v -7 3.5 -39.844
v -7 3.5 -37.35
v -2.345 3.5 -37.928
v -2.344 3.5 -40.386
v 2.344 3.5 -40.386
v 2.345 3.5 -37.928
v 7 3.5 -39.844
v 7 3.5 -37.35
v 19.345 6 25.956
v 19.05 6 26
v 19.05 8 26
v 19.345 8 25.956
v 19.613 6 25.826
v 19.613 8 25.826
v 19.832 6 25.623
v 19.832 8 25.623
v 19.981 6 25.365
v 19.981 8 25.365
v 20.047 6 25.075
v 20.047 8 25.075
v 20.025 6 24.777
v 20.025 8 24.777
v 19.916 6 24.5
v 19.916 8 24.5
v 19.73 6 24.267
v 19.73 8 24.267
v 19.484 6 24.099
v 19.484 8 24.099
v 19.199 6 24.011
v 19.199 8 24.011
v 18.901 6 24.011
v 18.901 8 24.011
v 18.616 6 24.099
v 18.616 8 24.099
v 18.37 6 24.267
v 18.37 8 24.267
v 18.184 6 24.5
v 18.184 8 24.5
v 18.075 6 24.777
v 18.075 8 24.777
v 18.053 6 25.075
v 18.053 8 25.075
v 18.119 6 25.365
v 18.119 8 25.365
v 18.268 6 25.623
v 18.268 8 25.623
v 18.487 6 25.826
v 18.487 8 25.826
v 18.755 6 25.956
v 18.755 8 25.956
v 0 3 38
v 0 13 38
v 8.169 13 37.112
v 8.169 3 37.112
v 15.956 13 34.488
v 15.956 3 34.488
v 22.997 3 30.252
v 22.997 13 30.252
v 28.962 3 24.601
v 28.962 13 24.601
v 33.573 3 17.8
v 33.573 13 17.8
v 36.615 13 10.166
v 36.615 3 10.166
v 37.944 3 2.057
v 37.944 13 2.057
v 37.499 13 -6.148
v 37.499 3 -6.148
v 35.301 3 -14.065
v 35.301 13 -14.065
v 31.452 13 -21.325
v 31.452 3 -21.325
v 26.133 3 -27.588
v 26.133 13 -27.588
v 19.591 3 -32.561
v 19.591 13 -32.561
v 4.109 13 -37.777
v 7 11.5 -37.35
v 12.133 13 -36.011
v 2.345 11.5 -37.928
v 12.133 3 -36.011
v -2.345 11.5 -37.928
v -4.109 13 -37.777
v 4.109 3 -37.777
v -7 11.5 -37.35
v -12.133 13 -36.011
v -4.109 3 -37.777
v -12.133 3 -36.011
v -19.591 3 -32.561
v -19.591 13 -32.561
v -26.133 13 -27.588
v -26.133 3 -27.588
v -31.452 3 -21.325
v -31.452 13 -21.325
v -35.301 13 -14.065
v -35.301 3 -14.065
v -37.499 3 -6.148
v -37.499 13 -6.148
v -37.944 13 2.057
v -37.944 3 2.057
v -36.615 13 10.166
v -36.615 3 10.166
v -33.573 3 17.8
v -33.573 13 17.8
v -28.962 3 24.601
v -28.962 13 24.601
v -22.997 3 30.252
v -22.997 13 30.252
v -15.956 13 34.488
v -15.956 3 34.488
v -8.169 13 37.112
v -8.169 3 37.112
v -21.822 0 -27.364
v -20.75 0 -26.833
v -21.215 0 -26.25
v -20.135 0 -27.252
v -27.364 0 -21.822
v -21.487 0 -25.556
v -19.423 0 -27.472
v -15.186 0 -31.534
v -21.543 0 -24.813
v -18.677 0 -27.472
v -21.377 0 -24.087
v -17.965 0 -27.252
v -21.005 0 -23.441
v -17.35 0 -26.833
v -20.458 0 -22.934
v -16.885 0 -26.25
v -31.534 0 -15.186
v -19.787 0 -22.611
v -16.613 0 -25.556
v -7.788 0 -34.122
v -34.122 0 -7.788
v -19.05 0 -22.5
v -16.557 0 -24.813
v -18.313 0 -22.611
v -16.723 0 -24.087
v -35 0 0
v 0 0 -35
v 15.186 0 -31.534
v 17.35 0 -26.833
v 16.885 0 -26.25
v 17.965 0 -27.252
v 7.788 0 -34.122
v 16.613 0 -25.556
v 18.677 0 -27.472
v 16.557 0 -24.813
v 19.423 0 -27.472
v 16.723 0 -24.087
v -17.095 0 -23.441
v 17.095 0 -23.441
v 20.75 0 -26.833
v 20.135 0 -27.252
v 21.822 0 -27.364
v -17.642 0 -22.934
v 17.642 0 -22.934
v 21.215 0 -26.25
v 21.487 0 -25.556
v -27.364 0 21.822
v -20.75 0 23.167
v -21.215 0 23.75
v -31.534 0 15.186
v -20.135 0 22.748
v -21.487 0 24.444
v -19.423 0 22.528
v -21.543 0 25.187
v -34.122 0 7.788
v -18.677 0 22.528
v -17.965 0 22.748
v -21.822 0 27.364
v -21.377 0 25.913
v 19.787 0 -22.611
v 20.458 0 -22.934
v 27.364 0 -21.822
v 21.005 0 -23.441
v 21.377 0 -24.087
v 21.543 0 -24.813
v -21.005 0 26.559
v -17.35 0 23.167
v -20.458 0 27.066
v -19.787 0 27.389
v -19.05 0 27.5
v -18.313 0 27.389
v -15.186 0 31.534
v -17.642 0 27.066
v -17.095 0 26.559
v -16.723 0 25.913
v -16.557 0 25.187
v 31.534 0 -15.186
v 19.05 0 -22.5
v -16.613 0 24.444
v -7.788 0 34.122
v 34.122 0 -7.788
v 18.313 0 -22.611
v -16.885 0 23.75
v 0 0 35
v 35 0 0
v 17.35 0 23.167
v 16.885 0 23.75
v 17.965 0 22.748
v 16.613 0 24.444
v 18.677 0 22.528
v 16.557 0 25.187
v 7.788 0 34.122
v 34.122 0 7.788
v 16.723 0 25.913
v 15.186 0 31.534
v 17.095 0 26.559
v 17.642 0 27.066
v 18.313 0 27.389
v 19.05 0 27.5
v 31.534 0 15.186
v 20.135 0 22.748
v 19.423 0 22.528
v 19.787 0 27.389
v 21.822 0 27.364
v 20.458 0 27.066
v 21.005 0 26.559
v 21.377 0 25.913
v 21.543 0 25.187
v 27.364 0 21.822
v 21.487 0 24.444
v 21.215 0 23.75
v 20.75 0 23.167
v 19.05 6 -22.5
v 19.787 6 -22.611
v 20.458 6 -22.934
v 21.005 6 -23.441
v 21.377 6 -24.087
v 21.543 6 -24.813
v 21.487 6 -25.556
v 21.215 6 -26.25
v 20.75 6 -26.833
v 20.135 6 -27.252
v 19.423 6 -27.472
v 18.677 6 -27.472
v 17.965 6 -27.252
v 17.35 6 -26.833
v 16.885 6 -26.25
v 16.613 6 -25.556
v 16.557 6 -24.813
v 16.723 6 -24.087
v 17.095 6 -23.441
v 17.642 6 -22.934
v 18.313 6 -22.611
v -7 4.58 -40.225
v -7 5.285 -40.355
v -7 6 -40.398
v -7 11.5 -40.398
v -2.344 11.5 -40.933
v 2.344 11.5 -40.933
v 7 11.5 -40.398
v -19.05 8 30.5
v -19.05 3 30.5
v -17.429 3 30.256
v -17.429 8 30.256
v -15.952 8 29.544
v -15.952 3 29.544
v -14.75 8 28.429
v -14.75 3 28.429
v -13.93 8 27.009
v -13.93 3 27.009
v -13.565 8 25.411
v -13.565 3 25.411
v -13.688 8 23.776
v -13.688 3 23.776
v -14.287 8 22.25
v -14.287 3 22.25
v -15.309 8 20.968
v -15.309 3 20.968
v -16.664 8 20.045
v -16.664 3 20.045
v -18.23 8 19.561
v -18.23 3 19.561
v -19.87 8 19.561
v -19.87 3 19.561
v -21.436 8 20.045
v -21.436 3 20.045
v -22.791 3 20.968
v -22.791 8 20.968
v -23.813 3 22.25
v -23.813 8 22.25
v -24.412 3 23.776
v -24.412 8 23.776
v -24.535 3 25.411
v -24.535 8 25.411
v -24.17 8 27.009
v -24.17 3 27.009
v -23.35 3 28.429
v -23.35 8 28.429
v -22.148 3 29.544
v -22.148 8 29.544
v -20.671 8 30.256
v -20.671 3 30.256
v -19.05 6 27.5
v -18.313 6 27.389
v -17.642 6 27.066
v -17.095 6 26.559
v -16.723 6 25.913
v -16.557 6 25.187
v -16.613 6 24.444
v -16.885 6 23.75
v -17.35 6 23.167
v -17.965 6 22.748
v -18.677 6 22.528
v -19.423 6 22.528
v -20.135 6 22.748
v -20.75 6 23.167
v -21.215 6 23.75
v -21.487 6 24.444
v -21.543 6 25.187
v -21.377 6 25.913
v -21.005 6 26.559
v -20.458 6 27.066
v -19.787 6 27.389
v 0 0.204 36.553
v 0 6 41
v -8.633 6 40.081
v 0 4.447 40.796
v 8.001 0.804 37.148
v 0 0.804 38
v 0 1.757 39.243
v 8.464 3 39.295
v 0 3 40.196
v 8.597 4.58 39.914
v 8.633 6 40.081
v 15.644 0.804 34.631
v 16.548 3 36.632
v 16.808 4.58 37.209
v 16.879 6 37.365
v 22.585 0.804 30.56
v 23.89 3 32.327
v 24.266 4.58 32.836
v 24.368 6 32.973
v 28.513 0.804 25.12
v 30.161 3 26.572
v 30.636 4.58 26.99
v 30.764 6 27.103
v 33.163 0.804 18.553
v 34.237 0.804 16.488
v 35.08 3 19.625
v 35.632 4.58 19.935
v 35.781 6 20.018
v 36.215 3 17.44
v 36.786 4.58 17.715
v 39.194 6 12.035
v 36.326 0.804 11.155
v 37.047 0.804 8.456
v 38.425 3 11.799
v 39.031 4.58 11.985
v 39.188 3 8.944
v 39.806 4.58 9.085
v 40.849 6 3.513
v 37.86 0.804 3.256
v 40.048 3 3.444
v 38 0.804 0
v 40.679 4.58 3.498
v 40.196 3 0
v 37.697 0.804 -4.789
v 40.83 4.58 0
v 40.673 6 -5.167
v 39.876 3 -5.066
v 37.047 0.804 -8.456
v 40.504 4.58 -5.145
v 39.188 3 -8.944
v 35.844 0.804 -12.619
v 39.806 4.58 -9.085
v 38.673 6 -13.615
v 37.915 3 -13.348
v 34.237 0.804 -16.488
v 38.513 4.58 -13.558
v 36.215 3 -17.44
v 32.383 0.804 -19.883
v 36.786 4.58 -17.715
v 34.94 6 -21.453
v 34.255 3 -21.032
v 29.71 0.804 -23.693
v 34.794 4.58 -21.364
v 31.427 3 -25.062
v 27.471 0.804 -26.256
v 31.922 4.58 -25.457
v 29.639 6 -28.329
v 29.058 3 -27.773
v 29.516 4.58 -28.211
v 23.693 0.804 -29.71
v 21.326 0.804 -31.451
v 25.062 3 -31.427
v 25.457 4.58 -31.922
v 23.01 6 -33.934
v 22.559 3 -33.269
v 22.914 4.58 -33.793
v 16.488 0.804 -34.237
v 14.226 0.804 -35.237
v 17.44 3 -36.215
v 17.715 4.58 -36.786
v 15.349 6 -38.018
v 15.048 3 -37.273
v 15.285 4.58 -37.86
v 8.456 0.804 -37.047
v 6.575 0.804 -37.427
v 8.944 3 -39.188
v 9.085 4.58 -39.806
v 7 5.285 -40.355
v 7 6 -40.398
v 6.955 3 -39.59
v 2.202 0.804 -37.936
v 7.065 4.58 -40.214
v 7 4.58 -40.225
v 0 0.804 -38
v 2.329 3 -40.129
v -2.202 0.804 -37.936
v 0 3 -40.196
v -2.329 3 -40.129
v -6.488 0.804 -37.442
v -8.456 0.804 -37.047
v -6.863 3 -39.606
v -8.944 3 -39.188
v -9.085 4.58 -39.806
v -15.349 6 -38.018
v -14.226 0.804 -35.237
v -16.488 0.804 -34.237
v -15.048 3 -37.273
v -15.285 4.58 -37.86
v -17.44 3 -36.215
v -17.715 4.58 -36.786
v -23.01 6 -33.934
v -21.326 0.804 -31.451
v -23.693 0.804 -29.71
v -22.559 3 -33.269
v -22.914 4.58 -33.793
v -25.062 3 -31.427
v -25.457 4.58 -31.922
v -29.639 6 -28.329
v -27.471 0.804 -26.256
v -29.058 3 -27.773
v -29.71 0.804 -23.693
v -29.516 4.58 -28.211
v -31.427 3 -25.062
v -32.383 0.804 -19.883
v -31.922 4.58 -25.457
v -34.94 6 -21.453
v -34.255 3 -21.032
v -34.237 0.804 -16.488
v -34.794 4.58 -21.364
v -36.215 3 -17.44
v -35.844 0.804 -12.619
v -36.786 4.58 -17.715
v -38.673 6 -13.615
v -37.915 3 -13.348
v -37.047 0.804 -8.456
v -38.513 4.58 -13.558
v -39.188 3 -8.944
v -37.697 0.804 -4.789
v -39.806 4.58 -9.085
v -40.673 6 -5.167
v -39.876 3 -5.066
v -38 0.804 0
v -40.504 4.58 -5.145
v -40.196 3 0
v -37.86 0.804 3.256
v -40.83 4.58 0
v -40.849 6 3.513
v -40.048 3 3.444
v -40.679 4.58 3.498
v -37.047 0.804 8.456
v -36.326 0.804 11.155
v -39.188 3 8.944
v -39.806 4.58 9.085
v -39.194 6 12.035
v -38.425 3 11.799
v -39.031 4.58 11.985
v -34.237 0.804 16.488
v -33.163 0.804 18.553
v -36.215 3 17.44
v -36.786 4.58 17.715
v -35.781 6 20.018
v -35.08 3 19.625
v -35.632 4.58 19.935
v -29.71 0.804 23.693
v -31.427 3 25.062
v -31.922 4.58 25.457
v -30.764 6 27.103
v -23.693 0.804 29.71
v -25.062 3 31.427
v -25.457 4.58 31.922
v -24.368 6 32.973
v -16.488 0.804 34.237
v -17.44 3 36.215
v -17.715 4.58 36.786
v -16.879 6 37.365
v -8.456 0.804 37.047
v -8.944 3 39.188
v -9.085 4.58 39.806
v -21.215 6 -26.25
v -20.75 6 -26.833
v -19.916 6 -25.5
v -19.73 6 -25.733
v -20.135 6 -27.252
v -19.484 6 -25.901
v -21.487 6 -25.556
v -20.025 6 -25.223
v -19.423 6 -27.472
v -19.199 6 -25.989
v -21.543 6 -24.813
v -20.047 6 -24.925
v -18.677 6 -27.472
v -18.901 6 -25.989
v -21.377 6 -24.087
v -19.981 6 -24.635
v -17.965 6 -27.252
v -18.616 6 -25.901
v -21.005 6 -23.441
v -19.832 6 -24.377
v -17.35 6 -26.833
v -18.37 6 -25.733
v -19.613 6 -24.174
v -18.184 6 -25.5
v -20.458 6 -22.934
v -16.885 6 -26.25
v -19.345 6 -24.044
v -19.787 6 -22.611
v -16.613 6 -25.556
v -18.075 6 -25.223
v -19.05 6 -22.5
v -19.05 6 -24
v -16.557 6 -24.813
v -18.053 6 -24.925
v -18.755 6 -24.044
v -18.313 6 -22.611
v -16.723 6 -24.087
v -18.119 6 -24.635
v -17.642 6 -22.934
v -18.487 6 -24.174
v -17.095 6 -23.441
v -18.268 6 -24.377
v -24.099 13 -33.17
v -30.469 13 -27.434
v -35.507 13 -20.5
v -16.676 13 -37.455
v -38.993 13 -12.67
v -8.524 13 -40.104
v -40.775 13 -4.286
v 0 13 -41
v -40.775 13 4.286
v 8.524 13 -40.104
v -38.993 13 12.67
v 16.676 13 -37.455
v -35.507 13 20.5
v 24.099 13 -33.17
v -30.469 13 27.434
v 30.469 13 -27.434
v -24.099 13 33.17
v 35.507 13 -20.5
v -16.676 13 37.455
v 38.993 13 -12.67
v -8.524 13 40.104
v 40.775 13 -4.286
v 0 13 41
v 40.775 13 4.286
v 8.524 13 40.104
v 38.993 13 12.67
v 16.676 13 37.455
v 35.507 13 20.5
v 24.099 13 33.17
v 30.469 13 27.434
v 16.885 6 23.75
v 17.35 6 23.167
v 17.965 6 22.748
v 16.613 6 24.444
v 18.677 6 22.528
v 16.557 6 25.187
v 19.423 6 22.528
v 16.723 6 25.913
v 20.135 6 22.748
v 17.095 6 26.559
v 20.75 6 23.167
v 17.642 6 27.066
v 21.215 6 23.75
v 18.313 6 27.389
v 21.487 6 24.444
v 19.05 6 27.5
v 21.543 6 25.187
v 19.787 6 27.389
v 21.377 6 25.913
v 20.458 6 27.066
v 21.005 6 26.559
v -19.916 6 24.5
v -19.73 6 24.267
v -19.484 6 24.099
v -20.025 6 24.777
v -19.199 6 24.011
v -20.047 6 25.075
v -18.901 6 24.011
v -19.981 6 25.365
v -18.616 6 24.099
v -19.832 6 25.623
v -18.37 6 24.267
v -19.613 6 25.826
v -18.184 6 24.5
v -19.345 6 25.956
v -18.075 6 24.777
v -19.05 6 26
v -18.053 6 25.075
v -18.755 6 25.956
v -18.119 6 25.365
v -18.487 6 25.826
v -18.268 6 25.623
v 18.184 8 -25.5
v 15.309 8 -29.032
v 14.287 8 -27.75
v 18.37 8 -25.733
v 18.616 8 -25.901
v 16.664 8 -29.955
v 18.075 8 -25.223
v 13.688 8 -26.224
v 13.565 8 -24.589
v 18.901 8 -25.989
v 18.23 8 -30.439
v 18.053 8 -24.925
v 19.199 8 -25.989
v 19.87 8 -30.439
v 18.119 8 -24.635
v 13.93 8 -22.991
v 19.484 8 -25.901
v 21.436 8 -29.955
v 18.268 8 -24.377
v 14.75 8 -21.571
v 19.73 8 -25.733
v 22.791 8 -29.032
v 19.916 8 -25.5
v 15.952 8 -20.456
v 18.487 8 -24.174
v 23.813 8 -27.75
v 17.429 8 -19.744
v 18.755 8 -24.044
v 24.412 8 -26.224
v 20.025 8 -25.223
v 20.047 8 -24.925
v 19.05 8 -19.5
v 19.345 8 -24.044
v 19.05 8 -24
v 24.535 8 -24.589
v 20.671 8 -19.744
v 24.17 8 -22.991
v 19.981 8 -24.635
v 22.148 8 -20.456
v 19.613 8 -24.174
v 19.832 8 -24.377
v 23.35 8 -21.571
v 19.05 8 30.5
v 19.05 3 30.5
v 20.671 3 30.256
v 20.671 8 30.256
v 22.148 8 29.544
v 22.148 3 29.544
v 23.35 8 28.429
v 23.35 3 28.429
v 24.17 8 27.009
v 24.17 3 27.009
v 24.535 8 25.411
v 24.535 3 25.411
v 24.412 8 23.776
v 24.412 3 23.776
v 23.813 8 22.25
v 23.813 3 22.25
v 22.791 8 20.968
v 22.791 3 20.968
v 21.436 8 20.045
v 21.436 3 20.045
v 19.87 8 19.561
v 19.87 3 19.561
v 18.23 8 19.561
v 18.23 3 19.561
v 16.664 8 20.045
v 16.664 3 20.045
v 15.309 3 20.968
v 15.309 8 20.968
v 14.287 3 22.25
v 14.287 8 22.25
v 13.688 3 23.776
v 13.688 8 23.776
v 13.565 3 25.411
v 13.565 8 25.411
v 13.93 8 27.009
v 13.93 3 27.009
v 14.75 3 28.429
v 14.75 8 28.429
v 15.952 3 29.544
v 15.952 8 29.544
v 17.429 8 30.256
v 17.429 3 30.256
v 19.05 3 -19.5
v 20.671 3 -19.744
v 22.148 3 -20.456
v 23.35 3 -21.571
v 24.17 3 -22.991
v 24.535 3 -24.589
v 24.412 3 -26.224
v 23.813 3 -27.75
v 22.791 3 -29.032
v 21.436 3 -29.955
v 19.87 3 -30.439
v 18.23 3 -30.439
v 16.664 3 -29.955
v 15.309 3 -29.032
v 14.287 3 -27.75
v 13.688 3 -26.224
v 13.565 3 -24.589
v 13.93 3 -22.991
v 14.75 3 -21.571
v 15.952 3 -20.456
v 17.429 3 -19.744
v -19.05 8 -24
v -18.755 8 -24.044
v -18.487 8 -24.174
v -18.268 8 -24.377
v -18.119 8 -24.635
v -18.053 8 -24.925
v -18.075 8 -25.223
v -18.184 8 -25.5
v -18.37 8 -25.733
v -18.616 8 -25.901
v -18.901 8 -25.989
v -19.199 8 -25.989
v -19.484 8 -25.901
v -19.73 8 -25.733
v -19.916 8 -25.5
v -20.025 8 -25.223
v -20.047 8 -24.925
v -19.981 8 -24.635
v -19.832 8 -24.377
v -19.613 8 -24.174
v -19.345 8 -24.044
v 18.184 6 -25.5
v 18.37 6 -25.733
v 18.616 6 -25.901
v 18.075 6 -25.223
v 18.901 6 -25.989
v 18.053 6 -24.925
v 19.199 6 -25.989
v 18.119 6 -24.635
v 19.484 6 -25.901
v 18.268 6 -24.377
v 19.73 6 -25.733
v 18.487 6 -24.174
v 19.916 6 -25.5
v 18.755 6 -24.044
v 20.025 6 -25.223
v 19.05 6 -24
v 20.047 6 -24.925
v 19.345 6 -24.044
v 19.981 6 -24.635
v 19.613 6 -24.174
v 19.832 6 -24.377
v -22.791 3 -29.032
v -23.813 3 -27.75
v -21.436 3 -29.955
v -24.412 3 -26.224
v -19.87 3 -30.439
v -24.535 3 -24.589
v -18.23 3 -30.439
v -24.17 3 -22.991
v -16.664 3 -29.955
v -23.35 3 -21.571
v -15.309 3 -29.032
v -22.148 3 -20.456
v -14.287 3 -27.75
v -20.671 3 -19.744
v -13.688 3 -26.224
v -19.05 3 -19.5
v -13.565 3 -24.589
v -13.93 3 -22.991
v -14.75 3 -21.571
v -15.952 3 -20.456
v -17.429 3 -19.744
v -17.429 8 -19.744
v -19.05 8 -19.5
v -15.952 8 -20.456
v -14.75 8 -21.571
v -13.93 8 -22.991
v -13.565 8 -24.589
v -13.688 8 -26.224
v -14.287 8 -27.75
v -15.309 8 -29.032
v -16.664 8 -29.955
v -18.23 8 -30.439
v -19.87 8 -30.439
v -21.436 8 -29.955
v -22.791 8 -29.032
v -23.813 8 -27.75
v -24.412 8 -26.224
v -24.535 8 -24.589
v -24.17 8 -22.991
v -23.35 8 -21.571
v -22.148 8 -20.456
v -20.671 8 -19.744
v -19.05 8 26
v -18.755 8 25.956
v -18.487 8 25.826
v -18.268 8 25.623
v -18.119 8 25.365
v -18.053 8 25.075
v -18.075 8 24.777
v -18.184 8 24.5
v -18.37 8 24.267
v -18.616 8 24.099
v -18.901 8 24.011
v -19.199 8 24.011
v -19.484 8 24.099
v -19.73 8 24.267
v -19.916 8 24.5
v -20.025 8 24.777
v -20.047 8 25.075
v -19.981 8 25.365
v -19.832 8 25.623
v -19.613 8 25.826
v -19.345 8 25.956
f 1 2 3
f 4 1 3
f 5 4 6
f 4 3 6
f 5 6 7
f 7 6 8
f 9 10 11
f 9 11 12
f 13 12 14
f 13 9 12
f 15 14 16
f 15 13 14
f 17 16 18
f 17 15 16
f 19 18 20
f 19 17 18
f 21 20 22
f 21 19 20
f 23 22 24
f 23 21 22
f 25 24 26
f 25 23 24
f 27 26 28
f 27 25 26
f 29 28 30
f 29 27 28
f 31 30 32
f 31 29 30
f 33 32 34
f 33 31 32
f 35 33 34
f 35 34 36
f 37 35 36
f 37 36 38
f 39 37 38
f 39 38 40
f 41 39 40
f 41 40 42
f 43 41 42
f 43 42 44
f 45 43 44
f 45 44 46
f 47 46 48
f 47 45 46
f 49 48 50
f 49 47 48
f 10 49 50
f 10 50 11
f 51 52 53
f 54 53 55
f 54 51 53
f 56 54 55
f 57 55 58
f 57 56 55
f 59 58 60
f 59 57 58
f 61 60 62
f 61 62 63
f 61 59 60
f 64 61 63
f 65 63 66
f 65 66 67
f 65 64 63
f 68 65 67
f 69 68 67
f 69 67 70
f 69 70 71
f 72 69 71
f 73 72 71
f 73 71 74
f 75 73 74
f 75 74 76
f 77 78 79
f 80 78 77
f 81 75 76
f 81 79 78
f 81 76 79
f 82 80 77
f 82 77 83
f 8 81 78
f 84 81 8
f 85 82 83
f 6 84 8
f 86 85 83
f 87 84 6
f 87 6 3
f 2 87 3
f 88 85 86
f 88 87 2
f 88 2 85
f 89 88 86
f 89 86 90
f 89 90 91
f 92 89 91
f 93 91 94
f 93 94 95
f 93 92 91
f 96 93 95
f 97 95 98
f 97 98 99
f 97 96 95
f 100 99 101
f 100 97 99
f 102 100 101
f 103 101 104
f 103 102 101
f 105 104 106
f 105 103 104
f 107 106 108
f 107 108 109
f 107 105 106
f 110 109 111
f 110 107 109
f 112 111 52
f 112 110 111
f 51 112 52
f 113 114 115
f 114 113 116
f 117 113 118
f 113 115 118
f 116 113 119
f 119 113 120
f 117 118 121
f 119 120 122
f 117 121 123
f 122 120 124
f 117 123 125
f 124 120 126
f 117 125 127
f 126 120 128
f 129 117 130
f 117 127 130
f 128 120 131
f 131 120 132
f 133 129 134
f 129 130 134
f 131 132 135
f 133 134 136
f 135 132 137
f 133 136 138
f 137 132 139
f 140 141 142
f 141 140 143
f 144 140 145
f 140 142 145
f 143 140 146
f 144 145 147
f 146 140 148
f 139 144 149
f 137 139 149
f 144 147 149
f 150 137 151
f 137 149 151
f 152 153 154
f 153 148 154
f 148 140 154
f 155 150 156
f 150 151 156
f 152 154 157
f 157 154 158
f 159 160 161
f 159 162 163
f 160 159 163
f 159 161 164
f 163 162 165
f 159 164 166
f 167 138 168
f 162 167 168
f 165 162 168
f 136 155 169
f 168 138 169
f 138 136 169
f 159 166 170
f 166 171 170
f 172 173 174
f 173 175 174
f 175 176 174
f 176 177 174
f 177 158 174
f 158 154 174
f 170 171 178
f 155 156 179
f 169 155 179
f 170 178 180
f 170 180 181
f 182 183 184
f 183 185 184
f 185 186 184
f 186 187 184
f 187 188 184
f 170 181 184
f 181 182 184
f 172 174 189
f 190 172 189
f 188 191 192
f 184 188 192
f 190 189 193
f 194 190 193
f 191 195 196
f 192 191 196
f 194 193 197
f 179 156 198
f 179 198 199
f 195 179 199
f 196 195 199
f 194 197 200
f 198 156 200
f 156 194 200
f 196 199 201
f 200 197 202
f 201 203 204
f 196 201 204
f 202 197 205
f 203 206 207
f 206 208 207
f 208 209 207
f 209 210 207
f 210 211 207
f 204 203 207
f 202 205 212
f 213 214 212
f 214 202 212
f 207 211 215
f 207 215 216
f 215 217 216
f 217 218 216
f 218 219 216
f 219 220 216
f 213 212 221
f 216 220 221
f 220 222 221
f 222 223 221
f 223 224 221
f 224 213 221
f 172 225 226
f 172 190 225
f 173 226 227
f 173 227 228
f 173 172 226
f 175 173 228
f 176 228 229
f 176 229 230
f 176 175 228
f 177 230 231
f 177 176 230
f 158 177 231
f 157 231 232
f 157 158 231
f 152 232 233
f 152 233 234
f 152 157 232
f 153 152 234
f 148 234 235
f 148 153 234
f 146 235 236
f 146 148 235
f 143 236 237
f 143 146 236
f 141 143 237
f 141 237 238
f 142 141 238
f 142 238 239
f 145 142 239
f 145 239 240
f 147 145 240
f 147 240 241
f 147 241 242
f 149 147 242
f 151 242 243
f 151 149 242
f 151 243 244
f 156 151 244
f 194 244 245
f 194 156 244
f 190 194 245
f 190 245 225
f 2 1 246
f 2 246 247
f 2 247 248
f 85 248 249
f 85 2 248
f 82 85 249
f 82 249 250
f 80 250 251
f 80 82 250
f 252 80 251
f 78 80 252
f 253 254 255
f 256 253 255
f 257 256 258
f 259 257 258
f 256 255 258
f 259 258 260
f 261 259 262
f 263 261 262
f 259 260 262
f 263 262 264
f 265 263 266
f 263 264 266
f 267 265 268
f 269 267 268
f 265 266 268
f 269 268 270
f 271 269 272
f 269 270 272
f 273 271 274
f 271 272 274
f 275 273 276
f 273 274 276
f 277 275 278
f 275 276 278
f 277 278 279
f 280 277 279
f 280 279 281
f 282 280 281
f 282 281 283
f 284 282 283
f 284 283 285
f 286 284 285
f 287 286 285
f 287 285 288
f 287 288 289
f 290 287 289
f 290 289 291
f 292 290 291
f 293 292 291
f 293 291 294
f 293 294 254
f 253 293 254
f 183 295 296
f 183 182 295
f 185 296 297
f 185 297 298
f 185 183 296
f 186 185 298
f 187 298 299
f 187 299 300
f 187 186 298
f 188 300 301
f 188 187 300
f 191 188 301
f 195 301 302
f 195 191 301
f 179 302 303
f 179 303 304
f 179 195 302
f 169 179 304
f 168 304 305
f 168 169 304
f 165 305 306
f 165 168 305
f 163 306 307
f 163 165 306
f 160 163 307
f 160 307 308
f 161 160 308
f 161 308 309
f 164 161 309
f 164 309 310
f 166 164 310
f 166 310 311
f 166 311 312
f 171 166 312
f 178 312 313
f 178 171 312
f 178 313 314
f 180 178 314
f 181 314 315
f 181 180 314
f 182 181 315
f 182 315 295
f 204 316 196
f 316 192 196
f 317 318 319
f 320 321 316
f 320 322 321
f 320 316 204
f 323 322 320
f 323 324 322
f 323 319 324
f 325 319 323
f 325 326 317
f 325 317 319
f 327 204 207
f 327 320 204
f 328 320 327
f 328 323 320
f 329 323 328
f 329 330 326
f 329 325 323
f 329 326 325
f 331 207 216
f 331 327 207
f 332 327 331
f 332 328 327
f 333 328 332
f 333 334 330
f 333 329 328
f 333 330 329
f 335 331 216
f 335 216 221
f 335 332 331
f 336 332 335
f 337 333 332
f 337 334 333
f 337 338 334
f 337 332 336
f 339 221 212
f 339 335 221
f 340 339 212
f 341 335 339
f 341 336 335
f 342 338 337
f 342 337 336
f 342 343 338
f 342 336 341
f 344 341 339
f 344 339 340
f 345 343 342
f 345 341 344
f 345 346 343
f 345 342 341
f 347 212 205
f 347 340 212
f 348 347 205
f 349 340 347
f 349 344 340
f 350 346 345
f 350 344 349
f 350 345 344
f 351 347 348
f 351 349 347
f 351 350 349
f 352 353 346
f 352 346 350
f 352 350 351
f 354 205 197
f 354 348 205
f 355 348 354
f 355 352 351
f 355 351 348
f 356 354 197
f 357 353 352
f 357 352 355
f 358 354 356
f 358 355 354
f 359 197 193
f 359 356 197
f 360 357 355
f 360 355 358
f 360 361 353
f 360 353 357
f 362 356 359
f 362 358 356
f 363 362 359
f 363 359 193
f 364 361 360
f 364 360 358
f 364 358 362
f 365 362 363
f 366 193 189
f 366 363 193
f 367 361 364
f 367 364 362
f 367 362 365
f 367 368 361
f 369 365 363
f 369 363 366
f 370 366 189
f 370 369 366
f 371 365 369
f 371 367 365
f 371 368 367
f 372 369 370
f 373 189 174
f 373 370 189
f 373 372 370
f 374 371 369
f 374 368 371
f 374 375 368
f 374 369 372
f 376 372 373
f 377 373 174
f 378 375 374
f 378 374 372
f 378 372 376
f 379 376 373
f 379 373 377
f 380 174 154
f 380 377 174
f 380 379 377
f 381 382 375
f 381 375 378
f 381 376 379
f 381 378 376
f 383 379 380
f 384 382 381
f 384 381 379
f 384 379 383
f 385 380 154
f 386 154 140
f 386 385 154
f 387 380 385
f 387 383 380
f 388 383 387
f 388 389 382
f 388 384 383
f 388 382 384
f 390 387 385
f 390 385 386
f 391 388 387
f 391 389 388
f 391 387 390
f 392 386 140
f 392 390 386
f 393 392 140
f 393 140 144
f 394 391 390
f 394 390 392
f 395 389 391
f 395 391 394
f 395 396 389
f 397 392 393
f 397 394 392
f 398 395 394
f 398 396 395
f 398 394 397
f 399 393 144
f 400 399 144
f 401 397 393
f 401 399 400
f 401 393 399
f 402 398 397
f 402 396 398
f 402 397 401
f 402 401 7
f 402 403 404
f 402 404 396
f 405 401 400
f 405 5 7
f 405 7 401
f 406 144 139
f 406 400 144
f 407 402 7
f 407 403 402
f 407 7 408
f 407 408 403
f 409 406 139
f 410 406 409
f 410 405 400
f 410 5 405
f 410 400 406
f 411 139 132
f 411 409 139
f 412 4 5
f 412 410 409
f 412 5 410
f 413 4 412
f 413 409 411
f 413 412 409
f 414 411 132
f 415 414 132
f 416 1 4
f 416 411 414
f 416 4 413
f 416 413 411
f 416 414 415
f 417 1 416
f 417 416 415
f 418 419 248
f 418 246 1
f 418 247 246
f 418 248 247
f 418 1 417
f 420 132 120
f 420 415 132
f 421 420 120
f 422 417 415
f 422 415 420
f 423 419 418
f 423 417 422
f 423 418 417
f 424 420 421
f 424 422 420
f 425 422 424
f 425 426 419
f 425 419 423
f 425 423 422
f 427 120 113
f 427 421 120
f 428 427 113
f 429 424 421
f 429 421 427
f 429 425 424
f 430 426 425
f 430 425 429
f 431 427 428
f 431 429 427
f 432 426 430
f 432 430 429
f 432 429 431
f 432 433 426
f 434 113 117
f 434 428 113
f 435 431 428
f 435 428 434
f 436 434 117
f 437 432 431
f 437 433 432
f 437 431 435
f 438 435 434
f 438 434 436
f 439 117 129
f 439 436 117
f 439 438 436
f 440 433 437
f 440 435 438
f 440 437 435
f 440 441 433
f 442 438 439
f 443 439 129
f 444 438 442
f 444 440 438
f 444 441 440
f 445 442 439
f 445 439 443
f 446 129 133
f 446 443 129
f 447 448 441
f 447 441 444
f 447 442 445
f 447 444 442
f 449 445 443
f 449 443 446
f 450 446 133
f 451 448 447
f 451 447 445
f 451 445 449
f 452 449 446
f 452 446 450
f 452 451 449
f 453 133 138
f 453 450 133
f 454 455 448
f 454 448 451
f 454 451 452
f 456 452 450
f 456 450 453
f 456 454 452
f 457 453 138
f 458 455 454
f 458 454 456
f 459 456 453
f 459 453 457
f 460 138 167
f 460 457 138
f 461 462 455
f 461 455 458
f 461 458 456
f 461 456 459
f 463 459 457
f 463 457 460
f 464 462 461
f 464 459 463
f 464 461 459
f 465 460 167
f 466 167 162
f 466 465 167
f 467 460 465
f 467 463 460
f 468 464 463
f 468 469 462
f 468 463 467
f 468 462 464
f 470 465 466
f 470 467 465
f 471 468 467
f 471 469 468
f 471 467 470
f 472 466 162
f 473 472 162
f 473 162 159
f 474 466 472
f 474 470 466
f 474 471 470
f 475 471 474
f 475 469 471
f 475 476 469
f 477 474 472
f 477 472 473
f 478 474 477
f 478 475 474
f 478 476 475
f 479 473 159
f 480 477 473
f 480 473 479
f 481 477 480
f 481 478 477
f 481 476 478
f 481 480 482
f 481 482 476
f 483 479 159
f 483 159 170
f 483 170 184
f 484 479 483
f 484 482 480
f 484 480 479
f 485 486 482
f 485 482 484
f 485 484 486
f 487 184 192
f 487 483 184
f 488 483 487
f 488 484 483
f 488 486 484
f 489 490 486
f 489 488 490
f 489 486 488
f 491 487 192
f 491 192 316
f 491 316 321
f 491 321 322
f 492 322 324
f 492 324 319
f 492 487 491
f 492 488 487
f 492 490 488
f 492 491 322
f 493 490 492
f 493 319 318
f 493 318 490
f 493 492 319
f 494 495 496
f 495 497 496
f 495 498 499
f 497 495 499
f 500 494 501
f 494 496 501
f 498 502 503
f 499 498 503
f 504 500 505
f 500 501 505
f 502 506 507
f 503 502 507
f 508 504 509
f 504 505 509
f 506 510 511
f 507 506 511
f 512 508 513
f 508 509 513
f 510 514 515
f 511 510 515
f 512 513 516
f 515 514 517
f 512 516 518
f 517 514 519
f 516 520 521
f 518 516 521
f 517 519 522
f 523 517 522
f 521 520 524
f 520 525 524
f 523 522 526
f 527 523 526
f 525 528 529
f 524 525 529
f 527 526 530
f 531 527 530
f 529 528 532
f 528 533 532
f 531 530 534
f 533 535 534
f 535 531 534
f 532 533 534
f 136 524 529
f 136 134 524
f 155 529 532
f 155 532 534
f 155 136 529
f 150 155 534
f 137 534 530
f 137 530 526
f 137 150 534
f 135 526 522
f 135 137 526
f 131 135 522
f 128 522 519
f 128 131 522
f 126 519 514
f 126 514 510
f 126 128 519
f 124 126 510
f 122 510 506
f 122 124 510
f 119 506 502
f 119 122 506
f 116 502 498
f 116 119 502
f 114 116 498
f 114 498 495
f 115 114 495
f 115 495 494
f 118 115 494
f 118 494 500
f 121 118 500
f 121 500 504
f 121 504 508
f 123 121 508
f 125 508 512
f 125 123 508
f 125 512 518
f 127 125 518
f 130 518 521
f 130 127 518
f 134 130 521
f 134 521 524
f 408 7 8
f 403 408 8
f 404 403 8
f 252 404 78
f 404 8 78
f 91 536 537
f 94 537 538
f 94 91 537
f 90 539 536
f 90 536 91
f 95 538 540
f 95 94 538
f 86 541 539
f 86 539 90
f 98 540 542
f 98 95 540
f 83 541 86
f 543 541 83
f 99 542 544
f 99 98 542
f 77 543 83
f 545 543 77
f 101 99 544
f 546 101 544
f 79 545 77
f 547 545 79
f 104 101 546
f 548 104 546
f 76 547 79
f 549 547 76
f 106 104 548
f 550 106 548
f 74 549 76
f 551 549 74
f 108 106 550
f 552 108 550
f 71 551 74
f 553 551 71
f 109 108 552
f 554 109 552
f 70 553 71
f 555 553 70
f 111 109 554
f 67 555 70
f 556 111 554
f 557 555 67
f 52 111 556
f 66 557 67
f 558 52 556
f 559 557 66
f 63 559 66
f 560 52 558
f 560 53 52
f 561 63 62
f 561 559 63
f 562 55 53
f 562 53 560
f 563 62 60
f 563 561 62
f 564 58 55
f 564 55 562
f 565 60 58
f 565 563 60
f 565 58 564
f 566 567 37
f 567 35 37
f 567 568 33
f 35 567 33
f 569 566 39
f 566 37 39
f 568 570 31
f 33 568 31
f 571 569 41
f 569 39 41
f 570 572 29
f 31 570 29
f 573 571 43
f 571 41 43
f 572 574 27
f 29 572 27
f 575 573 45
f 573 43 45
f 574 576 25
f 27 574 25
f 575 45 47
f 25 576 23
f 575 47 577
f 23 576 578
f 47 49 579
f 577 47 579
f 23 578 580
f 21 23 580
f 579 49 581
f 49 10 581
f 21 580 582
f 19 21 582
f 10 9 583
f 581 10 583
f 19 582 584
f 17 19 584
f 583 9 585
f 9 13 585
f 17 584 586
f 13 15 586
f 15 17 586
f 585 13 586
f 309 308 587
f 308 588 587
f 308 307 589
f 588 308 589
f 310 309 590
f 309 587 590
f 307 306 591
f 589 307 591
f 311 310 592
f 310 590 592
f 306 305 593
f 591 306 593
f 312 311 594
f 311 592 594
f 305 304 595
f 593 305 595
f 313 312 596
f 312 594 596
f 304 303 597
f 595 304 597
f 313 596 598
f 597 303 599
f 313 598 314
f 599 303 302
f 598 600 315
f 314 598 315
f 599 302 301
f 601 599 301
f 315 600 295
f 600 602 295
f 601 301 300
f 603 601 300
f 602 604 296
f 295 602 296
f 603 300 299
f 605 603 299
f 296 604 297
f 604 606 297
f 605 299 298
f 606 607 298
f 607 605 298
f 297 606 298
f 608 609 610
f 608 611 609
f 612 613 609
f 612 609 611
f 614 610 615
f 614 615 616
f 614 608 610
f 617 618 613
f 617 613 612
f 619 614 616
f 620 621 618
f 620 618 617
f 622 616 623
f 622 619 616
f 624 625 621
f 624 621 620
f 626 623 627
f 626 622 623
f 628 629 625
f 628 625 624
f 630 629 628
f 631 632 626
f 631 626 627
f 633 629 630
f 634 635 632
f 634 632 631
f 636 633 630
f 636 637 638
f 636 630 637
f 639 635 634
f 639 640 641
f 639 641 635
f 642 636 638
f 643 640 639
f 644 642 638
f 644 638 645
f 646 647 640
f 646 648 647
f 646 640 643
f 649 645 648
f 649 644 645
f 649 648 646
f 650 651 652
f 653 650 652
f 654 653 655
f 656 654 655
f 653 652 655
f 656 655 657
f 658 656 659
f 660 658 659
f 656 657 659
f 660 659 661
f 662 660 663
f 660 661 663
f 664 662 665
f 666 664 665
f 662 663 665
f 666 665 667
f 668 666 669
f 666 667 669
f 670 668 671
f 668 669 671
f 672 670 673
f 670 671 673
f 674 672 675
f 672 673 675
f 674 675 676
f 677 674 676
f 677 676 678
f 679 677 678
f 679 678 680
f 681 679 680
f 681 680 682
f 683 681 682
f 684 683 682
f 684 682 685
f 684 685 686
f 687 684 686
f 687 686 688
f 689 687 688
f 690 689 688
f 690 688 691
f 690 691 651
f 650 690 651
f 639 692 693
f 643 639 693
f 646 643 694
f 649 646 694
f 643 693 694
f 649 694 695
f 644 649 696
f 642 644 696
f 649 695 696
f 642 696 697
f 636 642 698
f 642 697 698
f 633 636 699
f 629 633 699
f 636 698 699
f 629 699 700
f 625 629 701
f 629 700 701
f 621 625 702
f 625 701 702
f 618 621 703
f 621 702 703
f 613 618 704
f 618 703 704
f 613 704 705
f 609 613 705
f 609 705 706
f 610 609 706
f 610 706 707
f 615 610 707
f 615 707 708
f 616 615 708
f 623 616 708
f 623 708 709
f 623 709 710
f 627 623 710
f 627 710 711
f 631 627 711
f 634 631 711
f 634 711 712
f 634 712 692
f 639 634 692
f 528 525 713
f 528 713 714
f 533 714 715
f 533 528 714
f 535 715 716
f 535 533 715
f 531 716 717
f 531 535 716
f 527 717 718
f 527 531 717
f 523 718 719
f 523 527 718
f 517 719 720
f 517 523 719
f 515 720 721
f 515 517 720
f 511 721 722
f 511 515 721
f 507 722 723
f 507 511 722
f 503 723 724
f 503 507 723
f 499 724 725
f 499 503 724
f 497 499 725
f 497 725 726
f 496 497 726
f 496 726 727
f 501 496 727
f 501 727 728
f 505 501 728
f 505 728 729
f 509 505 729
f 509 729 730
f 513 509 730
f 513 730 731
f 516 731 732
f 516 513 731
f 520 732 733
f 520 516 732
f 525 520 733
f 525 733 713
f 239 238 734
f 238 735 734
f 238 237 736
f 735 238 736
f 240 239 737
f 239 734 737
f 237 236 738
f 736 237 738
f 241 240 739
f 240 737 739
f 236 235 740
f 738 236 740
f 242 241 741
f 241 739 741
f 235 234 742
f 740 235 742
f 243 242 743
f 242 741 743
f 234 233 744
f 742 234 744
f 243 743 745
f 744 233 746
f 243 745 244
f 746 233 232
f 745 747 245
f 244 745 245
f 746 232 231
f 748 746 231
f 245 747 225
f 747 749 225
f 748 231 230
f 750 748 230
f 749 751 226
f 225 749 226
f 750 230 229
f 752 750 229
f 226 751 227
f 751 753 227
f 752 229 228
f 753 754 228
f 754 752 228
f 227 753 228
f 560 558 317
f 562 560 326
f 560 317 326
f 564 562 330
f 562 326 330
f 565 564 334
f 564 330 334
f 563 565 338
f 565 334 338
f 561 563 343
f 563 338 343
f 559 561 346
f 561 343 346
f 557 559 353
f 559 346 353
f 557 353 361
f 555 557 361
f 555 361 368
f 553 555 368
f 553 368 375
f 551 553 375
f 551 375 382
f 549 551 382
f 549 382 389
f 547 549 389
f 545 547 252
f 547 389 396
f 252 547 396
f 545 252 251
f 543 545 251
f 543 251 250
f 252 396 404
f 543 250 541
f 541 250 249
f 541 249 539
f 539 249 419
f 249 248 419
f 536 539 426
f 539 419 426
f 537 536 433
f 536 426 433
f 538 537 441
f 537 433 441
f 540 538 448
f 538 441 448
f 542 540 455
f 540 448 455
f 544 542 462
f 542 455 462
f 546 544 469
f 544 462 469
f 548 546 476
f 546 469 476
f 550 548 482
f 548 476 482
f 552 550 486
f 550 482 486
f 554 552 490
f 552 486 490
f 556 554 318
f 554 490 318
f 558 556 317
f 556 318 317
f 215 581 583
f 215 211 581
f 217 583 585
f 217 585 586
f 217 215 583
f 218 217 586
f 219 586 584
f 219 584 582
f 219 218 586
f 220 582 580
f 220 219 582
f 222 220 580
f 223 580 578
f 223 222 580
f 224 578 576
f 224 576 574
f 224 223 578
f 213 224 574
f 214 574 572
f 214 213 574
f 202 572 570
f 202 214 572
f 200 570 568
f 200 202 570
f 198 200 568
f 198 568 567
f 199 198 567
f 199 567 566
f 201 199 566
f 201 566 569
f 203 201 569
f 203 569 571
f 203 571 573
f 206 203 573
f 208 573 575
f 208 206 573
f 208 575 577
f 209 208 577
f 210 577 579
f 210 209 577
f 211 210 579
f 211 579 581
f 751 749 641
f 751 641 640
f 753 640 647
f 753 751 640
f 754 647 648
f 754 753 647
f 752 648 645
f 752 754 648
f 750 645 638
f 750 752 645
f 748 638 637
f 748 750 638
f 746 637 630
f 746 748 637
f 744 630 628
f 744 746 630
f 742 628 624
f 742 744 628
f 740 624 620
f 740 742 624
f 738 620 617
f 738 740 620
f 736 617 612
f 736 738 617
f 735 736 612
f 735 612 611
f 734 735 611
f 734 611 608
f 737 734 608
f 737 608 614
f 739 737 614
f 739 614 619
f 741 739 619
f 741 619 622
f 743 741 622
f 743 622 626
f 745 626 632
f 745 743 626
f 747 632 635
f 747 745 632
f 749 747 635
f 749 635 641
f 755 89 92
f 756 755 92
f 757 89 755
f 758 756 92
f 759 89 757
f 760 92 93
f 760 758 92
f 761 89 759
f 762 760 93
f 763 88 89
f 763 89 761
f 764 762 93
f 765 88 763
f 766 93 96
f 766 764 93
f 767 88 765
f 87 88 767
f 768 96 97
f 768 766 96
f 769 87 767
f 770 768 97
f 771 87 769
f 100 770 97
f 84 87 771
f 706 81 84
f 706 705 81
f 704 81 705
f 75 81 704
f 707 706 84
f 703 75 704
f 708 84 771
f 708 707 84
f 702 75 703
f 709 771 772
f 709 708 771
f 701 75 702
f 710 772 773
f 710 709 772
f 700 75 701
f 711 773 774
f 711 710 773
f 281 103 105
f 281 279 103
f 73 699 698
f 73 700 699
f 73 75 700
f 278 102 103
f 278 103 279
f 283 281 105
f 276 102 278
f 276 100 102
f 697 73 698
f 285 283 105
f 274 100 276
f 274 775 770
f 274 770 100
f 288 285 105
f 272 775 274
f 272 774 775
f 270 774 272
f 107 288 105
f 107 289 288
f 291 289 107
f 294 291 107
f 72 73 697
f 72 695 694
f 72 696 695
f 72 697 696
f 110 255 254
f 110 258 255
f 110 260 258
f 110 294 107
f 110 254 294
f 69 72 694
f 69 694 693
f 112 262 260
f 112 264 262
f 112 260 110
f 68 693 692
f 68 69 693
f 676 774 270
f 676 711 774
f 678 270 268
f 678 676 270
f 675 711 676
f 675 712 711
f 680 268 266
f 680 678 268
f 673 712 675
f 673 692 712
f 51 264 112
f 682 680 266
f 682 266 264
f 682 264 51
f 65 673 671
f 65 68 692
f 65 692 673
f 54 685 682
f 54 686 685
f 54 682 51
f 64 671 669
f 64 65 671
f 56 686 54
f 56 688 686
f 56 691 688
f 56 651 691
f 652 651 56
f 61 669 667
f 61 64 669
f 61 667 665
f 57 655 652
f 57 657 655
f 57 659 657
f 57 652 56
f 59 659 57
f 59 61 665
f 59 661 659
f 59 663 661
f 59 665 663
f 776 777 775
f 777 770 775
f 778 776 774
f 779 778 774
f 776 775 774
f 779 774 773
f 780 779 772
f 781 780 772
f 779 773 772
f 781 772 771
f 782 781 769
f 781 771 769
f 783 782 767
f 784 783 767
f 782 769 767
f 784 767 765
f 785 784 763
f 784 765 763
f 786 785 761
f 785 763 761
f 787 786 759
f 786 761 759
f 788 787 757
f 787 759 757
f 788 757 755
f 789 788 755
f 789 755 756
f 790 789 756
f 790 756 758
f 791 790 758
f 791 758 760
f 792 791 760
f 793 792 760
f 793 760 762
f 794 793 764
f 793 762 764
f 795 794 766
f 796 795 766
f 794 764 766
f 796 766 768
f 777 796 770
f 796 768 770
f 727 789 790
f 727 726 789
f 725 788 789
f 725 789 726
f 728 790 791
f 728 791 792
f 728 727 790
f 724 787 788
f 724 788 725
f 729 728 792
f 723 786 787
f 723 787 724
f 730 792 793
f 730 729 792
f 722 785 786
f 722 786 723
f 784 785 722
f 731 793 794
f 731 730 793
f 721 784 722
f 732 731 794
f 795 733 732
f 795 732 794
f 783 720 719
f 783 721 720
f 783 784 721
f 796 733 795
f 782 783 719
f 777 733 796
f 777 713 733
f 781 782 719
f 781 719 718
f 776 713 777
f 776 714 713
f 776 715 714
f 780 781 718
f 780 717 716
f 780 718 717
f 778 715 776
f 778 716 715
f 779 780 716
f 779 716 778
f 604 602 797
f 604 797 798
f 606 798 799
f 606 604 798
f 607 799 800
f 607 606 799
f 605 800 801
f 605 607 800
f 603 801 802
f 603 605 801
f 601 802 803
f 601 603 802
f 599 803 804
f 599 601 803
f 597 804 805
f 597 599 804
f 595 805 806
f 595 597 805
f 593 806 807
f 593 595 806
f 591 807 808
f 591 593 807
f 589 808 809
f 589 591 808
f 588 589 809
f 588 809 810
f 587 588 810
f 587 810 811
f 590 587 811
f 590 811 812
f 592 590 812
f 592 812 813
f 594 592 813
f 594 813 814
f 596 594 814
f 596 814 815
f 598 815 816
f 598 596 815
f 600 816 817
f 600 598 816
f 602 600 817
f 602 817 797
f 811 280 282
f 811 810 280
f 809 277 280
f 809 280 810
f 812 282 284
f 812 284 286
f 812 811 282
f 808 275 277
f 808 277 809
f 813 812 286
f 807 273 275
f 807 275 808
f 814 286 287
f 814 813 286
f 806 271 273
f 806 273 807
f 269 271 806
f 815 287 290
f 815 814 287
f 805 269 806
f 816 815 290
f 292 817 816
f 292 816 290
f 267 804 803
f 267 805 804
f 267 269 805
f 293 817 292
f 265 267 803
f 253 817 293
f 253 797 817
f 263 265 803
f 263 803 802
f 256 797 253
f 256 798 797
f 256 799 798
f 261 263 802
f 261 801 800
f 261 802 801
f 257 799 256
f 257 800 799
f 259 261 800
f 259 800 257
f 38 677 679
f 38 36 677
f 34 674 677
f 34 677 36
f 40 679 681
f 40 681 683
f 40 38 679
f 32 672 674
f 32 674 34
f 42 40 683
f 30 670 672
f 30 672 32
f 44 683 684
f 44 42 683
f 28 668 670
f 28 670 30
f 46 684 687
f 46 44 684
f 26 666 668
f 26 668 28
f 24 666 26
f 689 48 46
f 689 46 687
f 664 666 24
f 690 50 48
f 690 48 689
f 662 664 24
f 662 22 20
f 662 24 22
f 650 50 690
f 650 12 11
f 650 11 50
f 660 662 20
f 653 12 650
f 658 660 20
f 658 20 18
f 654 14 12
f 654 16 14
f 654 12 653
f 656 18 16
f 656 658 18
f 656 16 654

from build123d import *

# Parameters (mm, degrees)
SKETCH1_R           = 41
SKETCH1_R_2         = 2.5
BOSS_EXTRUDE1_DEPTH = 3
SKETCH3_R           = 41
SKETCH3_R_2         = 38
BOSS_EXTRUDE2_DEPTH = 10
SKETCH3_3_R         = 5.5
SKETCH3_3_R_2       = 2.5
BOSS_EXTRUDE3_DEPTH = 3
SKETCH4_R           = 5.5
SKETCH4_R_2         = 1
BOSS_EXTRUDE4_DEPTH = 2
FILLET1_R           = 6
SKETCH6_W           = 14
SKETCH6_H           = 8
CUT_EXTRUDE1_DEPTH  = 60.422218067


with BuildPart() as part:
    # Sketch1 → Boss-Extrude1 (new body)
    with BuildSketch(Plane(origin=(0, 0, 0), x_dir=(1, 0, 0), z_dir=(0, 1, 0))):
        Circle(SKETCH1_R)
        with Locations((-19.05, 25)):
            Circle(SKETCH1_R_2, mode=Mode.SUBTRACT)
        with Locations((19.05, 25)):
            Circle(SKETCH1_R_2, mode=Mode.SUBTRACT)
        with Locations((19.05, -25)):
            Circle(SKETCH1_R_2, mode=Mode.SUBTRACT)
        with Locations((-19.05, -25)):
            Circle(SKETCH1_R_2, mode=Mode.SUBTRACT)
    extrude(amount=BOSS_EXTRUDE1_DEPTH)

    # Sketch3 → Boss-Extrude2 (add)
    with BuildSketch(Plane(origin=(0, 3, 0), x_dir=(1, 0, 0), z_dir=(0, 1, 0))):
        Circle(SKETCH3_R)
        Circle(SKETCH3_R_2, mode=Mode.SUBTRACT)
    extrude(amount=BOSS_EXTRUDE2_DEPTH)

    # Sketch3<3> → Boss-Extrude3 (add)
    # profile 1 of 4: a face of its own
    with BuildSketch(Plane(origin=(0, 3, 0), x_dir=(1, 0, 0), z_dir=(0, 1, 0))):
        with Locations((-19.05, 25)):
            Circle(SKETCH3_3_R)
        with Locations((-19.05, 25)):
            Circle(SKETCH3_3_R_2, mode=Mode.SUBTRACT)
    # profile 2 of 4: a face of its own
    with BuildSketch(Plane(origin=(0, 3, 0), x_dir=(1, 0, 0), z_dir=(0, 1, 0))):
        with Locations((19.05, 25)):
            Circle(SKETCH3_3_R)
        with Locations((19.05, 25)):
            Circle(SKETCH3_3_R_2, mode=Mode.SUBTRACT)
    # profile 3 of 4: a face of its own
    with BuildSketch(Plane(origin=(0, 3, 0), x_dir=(1, 0, 0), z_dir=(0, 1, 0))):
        with Locations((19.05, -25)):
            Circle(SKETCH3_3_R)
        with Locations((19.05, -25)):
            Circle(SKETCH3_3_R_2, mode=Mode.SUBTRACT)
    # profile 4 of 4: a face of its own
    with BuildSketch(Plane(origin=(0, 3, 0), x_dir=(1, 0, 0), z_dir=(0, 1, 0))):
        with Locations((-19.05, -25)):
            Circle(SKETCH3_3_R)
        with Locations((-19.05, -25)):
            Circle(SKETCH3_3_R_2, mode=Mode.SUBTRACT)
    extrude(amount=BOSS_EXTRUDE3_DEPTH)

    # Sketch4 → Boss-Extrude4 (add)
    # profile 1 of 4: a face of its own
    with BuildSketch(Plane(origin=(0, 6, 0), x_dir=(1, 0, 0), z_dir=(0, 1, 0))):
        with Locations((-19.05, 25)):
            Circle(SKETCH4_R)
        with Locations((-19.05, 25)):
            Circle(SKETCH4_R_2, mode=Mode.SUBTRACT)
    # profile 2 of 4: a face of its own
    with BuildSketch(Plane(origin=(0, 6, 0), x_dir=(1, 0, 0), z_dir=(0, 1, 0))):
        with Locations((19.05, 25)):
            Circle(SKETCH4_R)
        with Locations((19.05, 25)):
            Circle(SKETCH4_R_2, mode=Mode.SUBTRACT)
    # profile 3 of 4: a face of its own
    with BuildSketch(Plane(origin=(0, 6, 0), x_dir=(1, 0, 0), z_dir=(0, 1, 0))):
        with Locations((19.05, -25)):
            Circle(SKETCH4_R)
        with Locations((19.05, -25)):
            Circle(SKETCH4_R_2, mode=Mode.SUBTRACT)
    # profile 4 of 4: a face of its own
    with BuildSketch(Plane(origin=(0, 6, 0), x_dir=(1, 0, 0), z_dir=(0, 1, 0))):
        with Locations((-19.05, -25)):
            Circle(SKETCH4_R)
        with Locations((-19.05, -25)):
            Circle(SKETCH4_R_2, mode=Mode.SUBTRACT)
    extrude(amount=BOSS_EXTRUDE4_DEPTH)

    # Fillet1
    fillet1_edges = [part.edges().sort_by_distance(p)[0] for p in [
        (-41, 0, 0),
    ]]
    fillet(fillet1_edges, radius=FILLET1_R)

    # Sketch6 → Cut-Extrude1 (cut, through all)
    with BuildSketch(Plane.XY):
        with Locations((0, 7.5)):
            Rectangle(SKETCH6_W, SKETCH6_H)
    extrude(amount=-CUT_EXTRUDE1_DEPTH, mode=Mode.SUBTRACT)


solid = part.part
